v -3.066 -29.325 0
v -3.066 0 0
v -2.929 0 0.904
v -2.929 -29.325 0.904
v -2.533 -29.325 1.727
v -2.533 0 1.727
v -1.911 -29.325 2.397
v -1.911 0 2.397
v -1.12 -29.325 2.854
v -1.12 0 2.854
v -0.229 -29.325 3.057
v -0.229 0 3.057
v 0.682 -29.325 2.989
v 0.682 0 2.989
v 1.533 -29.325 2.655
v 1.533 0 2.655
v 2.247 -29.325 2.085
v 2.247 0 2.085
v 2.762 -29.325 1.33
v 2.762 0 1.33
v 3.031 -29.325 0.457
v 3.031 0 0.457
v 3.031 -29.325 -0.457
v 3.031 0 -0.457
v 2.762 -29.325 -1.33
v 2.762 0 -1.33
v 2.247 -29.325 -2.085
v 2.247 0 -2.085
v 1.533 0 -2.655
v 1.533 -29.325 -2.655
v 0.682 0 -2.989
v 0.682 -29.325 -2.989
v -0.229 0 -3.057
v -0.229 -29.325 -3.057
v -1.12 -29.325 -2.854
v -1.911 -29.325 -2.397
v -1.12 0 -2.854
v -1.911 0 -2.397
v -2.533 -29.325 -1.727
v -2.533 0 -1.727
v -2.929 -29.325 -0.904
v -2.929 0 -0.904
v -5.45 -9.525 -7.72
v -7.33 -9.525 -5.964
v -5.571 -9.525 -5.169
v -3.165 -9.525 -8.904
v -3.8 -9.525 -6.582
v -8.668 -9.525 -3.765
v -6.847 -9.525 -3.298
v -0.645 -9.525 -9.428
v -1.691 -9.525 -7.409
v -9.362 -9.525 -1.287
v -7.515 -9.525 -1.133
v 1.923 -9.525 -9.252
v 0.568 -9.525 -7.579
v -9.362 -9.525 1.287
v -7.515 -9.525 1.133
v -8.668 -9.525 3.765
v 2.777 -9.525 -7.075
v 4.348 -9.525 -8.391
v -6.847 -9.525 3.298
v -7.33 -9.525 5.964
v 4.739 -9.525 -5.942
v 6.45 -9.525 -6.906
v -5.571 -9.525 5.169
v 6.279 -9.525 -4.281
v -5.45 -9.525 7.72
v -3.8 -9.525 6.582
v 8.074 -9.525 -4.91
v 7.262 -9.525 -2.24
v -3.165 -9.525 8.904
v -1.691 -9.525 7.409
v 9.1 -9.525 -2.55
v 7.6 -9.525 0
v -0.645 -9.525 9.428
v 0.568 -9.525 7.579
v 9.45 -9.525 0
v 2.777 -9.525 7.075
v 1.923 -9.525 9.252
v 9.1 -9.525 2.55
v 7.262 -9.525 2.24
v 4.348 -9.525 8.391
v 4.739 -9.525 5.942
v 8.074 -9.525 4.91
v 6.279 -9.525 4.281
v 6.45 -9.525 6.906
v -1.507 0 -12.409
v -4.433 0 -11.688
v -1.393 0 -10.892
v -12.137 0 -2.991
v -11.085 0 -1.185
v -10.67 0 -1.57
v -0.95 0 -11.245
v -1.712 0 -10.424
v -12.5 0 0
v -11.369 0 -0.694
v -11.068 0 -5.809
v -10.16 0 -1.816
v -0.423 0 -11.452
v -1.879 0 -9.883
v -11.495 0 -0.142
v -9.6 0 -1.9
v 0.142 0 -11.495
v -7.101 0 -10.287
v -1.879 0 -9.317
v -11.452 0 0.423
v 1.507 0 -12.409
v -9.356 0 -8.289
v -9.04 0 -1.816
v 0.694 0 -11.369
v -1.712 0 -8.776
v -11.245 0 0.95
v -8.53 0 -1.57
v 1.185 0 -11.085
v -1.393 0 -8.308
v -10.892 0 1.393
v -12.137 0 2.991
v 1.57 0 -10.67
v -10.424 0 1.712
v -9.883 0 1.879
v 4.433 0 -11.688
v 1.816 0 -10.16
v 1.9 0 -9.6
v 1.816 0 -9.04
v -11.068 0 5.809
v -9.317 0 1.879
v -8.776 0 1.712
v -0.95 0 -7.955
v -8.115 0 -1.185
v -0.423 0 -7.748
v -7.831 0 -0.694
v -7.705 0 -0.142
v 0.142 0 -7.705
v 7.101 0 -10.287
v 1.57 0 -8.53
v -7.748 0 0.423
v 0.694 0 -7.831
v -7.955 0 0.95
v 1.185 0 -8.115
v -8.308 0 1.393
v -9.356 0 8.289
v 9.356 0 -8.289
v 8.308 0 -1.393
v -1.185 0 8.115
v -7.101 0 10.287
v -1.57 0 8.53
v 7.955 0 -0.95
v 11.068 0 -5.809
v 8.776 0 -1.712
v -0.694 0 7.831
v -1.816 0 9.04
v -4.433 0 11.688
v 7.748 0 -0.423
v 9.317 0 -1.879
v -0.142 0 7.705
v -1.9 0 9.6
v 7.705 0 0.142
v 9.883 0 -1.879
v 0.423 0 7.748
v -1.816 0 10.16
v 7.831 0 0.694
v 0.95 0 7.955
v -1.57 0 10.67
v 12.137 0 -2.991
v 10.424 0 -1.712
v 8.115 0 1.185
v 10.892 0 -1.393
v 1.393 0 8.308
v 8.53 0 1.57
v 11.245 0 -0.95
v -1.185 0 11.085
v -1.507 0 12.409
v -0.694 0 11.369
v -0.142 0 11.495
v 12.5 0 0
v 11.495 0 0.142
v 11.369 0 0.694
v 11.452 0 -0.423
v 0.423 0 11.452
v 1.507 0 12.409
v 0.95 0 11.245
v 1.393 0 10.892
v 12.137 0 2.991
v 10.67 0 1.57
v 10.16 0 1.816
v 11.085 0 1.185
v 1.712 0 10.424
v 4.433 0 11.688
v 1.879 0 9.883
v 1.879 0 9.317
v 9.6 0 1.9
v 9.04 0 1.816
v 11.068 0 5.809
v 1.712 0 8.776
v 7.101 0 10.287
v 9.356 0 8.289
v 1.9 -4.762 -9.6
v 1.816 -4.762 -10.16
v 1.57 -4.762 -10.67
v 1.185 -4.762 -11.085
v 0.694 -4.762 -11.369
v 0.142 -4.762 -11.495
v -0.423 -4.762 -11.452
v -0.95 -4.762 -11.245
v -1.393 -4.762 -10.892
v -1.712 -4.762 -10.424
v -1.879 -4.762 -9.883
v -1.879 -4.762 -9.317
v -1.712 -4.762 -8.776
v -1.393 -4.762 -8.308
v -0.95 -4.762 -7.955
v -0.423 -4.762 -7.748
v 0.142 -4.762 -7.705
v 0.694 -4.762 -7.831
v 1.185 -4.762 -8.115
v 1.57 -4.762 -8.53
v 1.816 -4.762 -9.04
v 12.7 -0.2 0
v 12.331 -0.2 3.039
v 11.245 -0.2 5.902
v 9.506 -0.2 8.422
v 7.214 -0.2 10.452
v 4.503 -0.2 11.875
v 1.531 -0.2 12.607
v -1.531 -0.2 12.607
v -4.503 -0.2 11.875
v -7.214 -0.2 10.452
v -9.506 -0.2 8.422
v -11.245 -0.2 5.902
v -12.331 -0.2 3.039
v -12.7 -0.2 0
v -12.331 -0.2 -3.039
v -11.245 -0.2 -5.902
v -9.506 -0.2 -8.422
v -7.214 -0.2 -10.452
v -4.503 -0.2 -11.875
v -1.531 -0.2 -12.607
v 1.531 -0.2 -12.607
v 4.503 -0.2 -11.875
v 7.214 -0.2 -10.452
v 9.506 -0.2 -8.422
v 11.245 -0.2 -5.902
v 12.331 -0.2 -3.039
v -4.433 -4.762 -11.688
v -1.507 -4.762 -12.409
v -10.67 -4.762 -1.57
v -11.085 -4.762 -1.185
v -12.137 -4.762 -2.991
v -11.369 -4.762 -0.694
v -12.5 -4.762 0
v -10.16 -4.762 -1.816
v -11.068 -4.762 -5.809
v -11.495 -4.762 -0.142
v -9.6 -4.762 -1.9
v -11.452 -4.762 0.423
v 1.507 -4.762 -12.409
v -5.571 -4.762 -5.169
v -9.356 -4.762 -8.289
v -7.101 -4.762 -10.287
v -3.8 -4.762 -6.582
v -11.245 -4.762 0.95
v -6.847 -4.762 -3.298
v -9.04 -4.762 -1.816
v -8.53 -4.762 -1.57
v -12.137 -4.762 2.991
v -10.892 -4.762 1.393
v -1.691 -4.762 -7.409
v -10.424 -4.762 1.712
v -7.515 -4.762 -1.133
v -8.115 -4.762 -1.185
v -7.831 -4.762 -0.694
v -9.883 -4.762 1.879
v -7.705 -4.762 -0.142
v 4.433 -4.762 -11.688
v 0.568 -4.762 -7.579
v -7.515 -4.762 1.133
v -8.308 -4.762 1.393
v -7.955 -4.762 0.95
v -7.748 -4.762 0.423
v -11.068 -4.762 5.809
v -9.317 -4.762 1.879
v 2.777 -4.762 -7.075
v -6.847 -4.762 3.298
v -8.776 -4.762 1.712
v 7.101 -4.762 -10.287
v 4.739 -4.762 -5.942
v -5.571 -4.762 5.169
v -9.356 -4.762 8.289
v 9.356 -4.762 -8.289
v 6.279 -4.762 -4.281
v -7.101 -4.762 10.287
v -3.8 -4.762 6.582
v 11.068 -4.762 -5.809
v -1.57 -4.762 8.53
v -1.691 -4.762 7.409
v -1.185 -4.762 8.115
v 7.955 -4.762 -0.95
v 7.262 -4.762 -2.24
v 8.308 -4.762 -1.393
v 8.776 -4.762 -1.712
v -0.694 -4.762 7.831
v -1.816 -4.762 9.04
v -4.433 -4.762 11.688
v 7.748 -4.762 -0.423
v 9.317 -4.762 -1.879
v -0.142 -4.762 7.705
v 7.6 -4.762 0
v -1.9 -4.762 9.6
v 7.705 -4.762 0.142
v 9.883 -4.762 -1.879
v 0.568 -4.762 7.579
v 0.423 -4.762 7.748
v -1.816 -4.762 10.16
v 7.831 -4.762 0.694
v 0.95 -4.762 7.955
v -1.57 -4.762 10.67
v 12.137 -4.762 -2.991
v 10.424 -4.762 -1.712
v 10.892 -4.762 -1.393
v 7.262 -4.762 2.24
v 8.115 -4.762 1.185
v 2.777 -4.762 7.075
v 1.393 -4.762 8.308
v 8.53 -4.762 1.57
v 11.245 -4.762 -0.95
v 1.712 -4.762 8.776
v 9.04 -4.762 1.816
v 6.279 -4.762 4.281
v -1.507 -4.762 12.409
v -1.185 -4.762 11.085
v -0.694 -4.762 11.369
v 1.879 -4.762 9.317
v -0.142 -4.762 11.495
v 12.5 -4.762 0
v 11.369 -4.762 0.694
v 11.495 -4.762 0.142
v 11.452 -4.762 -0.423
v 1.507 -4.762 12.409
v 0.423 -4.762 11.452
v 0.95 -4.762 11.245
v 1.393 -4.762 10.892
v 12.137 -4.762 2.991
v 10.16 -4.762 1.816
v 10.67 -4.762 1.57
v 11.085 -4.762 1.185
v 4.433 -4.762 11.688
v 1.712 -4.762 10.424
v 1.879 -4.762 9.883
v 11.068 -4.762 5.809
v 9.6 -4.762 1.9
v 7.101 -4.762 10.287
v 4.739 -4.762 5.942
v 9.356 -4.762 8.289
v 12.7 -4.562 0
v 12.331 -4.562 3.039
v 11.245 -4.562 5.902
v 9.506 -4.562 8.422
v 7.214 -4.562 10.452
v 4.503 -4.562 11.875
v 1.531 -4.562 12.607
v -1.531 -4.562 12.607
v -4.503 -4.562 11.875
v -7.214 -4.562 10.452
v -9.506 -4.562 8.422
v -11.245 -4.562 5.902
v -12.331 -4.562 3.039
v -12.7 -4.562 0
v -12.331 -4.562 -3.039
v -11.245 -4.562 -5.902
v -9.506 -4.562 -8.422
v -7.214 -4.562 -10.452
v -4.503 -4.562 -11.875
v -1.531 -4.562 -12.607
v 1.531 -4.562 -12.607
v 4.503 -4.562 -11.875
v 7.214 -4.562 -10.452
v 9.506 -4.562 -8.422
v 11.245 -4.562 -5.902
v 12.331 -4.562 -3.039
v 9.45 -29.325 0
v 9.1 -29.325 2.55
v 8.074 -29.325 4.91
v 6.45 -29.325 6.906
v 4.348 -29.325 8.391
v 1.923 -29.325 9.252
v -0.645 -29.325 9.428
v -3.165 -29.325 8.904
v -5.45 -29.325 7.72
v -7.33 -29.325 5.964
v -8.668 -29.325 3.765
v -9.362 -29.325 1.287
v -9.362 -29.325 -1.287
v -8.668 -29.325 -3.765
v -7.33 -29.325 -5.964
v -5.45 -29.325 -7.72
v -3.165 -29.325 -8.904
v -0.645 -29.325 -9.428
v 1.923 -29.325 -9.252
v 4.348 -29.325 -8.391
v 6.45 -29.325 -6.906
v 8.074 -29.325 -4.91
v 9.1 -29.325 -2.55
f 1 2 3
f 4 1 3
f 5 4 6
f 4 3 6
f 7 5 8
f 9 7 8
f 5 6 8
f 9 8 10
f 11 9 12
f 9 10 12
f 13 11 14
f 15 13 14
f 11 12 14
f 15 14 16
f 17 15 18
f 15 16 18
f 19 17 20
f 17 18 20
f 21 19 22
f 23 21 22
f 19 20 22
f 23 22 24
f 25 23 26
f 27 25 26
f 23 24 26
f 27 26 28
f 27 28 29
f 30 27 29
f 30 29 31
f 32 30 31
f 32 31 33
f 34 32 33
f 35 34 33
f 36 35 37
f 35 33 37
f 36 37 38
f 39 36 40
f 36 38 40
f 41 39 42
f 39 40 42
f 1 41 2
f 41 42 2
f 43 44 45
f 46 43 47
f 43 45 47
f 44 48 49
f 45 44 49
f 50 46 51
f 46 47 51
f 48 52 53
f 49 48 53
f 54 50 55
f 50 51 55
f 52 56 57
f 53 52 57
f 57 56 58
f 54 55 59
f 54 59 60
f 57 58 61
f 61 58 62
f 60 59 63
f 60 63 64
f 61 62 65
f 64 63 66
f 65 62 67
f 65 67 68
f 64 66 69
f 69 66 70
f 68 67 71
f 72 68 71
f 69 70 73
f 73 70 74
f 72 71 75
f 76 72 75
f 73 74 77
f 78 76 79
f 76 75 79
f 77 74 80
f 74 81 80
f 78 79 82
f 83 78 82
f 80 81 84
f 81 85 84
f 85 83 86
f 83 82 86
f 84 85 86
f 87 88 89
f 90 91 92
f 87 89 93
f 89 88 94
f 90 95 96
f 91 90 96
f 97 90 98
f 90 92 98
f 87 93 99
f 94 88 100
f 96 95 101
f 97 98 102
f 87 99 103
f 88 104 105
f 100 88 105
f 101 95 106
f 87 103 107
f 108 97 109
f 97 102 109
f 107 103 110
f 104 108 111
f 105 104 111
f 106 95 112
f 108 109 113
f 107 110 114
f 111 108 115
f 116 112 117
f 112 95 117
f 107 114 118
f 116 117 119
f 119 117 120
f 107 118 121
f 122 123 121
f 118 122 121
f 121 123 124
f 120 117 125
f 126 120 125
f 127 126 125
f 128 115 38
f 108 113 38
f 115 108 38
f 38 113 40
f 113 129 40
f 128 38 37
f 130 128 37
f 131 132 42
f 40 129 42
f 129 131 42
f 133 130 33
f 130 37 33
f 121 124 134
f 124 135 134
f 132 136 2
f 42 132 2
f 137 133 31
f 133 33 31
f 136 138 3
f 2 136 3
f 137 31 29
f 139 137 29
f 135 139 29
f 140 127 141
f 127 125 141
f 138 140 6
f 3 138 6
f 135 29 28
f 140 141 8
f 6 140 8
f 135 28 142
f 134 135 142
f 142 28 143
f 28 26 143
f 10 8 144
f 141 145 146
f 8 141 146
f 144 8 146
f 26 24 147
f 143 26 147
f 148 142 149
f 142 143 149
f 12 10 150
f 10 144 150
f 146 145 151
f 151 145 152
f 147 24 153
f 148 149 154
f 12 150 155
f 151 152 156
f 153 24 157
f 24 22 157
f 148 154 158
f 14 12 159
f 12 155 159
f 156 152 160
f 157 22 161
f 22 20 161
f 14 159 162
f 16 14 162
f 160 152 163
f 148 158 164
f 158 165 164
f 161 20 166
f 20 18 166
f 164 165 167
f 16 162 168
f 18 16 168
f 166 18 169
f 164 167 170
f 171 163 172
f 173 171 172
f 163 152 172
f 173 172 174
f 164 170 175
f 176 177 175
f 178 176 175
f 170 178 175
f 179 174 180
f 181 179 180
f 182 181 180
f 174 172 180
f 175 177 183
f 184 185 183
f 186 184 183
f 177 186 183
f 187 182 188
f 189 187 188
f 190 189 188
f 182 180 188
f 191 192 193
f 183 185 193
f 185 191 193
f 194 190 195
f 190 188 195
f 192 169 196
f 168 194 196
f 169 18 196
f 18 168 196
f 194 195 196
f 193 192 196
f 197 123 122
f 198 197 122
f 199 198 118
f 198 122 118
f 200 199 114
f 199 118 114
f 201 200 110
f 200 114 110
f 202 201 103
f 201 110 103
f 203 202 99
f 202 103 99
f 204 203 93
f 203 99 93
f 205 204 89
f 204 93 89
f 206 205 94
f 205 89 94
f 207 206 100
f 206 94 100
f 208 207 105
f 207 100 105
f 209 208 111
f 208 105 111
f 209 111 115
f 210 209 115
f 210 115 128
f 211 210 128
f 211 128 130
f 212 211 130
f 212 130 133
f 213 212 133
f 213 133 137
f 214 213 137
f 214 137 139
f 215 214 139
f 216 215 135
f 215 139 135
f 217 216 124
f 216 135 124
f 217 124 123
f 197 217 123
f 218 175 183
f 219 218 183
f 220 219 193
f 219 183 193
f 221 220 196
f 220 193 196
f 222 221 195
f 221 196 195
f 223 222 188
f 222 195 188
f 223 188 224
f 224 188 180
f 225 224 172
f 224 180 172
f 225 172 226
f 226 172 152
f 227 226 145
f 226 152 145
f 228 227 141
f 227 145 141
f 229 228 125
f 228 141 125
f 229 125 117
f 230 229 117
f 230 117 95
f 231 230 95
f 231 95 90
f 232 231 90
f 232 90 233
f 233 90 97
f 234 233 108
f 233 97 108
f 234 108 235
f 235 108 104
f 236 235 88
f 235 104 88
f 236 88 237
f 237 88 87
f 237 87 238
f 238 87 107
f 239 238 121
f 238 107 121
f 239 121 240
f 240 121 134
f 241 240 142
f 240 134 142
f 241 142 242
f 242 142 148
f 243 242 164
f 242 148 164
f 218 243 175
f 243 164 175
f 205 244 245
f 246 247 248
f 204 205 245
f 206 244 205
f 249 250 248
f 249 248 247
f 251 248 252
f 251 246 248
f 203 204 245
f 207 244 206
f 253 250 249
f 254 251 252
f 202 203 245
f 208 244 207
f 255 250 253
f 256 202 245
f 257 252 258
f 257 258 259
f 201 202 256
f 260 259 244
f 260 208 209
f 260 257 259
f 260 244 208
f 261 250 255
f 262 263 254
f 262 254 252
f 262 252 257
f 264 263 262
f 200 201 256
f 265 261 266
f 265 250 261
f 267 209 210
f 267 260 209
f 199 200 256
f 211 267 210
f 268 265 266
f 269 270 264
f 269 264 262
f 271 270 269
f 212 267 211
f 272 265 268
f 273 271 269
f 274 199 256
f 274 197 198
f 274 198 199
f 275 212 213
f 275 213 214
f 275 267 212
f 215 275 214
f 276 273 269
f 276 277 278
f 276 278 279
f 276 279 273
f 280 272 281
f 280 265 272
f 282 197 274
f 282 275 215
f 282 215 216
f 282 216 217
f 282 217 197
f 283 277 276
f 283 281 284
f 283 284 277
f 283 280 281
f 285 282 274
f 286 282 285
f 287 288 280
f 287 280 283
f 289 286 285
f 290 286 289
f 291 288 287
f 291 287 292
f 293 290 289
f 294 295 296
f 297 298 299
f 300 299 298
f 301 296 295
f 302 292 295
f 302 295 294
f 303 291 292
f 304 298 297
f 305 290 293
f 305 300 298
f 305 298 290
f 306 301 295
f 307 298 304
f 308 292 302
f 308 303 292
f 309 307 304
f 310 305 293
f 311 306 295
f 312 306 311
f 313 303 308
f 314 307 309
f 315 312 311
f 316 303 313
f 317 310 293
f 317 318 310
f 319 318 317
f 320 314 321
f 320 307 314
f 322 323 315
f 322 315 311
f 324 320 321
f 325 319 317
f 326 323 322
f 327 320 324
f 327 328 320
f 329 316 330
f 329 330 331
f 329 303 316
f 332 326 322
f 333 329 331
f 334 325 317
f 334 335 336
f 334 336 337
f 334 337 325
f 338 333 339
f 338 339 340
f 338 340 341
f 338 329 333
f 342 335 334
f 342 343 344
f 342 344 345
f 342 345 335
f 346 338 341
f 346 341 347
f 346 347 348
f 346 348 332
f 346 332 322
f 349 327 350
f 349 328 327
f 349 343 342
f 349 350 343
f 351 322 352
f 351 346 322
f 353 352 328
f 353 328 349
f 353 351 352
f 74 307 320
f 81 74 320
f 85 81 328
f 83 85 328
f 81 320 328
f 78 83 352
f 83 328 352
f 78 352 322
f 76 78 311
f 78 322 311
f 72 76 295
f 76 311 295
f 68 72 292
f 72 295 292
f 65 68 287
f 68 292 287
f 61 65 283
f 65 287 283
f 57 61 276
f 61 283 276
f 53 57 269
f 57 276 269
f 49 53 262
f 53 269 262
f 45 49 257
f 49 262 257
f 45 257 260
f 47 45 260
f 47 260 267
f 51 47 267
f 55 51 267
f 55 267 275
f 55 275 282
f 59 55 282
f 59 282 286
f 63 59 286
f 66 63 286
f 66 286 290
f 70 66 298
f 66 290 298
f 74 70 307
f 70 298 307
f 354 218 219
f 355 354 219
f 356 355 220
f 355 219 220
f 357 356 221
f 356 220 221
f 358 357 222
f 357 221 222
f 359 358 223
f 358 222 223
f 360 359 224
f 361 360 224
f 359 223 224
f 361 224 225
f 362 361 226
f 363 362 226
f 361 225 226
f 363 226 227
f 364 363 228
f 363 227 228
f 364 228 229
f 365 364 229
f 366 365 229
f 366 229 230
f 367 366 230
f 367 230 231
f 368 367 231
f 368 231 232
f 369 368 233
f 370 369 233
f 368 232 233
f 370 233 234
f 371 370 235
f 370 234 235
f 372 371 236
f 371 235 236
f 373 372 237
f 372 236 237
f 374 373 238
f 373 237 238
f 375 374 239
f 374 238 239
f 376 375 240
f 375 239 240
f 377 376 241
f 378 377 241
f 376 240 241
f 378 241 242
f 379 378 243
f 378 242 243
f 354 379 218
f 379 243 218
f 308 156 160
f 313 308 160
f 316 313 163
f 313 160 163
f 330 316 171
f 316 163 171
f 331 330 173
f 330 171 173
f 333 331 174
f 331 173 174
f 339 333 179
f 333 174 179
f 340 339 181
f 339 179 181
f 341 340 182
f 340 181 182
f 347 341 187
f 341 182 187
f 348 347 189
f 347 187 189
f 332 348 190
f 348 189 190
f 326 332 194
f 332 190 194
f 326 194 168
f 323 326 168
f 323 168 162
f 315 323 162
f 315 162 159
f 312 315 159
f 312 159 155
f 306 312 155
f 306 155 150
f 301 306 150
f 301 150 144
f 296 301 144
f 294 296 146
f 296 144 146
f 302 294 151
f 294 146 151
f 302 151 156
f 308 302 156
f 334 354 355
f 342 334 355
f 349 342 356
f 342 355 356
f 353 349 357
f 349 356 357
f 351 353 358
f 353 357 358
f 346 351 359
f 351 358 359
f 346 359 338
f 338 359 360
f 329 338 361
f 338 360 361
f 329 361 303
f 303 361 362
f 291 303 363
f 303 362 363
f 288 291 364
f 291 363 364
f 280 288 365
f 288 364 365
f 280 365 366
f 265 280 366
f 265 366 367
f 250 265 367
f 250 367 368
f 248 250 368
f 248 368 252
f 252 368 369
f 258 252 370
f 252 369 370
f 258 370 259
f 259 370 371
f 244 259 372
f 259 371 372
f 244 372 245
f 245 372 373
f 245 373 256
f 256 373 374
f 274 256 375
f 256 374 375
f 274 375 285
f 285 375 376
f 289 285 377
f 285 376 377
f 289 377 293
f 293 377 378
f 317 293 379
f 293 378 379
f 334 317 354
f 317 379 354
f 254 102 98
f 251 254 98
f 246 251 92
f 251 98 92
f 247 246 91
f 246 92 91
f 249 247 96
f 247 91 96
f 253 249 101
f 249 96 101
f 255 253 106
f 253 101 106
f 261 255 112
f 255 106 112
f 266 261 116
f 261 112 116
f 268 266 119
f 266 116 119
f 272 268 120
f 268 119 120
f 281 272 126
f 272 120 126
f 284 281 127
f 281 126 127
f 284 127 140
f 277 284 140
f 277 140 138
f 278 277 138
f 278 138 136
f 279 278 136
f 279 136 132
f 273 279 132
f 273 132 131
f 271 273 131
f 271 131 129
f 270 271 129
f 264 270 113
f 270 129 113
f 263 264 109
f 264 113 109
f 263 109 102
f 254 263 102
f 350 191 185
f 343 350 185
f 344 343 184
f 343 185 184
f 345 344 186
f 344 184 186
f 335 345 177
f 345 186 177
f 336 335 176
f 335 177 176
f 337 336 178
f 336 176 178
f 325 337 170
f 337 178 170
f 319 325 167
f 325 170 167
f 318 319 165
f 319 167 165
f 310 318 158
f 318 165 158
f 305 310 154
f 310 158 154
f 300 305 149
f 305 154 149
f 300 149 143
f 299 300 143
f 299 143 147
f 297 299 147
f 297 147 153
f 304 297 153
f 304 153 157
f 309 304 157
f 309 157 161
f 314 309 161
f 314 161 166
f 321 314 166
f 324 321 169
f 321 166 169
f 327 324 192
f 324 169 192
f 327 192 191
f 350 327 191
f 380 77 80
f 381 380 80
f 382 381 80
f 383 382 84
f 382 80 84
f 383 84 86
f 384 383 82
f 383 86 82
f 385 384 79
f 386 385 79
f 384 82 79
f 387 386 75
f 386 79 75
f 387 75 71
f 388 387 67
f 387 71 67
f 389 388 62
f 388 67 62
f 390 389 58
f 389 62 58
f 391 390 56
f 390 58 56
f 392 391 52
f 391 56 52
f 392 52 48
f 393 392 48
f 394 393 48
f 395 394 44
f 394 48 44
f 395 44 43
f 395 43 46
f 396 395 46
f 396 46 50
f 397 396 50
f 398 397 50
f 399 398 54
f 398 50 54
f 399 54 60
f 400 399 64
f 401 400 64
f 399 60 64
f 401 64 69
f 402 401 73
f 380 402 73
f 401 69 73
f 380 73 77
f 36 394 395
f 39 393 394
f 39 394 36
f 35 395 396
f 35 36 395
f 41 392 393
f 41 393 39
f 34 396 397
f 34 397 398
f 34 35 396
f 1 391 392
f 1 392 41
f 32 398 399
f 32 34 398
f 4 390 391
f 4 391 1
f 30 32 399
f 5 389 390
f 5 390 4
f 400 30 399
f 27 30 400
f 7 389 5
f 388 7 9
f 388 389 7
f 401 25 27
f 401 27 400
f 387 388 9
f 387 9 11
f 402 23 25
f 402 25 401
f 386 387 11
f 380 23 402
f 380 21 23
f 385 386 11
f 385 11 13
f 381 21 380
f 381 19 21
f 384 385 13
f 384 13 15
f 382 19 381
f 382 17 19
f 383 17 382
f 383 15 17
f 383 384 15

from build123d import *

# Parameters (mm, degrees)
F0_R            = 12.7
F1_DEPTH        = 4.7625
F2_R            = 7.6
F3_DEPTH        = 4.7625
F4_R            = 9.45
F4_R_2          = 7.6
F5_DEPTH        = 19.8
F6_SIZE         = 0.2
F7_R            = 1.9
F9_DEPTH        = 4.7625
F9_COPIES_COUNT = 4
F10_R           = 3.0655
F11_DEPTH       = 29.325


# Not quite as in the source:
# - a pattern or mirror of a feature is missing from the dataset's text; its kind, count and spacing are read off the source's solid


with BuildPart() as f1:
    # F0 (on Front) → F1 (new body)
    with BuildSketch(Plane.XZ):
        Circle(F0_R)
    extrude(amount=F1_DEPTH)

    # F2 (on face) → F3 (join)
    with BuildSketch(Plane.XZ.offset(4.7625)):
        Circle(F2_R)
    extrude(amount=F3_DEPTH)

    # F4 (on face) → F5 (join)
    with BuildSketch(Plane.XZ.offset(9.525)):
        Circle(F4_R)
        Circle(F4_R_2, mode=Mode.SUBTRACT)
        Circle(F4_R_2)
    extrude(amount=F5_DEPTH)

    # F6
    f6_edges = [f1.edges().sort_by_distance(p)[0] for p in [
        (-12.7, 0, 0),
        (-12.7, -4.7625, 0),
    ]]
    chamfer(f6_edges, length=F6_SIZE)

    # F7 (on face) → F9 (cut, through all)
    with BuildSketch(Plane(origin=(0, 0, 0), x_dir=(-1, 0, 0), z_dir=(0, 1, 0))):
        with Locations((0, 9.6)):
            Circle(F7_R)
    f9 = extrude(amount=-F9_DEPTH, mode=Mode.SUBTRACT)

    # F9_copies: F9 ×4 about axis
    f9_copies_axis = Axis((0, 0, 0), (0, 1, 0))
    for i in range(1, F9_COPIES_COUNT):
        add(f9.rotate(f9_copies_axis, i * 360 / F9_COPIES_COUNT), mode=Mode.SUBTRACT)

    # F10 (on face) → F11 (cut, through all)
    with BuildSketch(Plane(origin=(0, 0, 0), x_dir=(-1, 0, 0), z_dir=(0, 1, 0))):
        Circle(F10_R)
    extrude(amount=-F11_DEPTH, mode=Mode.SUBTRACT)


solid = f1.part
